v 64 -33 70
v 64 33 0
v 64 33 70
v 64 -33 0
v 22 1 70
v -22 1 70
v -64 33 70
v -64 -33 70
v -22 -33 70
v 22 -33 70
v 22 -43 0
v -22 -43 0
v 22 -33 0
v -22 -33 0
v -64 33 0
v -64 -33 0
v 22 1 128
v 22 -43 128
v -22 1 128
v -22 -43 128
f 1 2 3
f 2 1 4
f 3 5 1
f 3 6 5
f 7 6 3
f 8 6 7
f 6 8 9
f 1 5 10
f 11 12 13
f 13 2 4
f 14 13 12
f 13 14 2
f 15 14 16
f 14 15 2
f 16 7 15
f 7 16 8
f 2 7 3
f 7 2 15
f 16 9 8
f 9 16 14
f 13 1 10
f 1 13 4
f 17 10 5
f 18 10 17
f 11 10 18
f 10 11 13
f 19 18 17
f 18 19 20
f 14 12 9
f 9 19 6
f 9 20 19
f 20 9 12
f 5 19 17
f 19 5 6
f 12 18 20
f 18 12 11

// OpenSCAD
// Santa's Workshop centrepiece: five massing studies, ~190 mm tall.
// Blockouts for choosing a form, not print geometry.
// form = 1 grand hall + clock tower, 2 cross plan, 3 rotunda,
//        4 workshop castle, 5 toy factory
// part = body | roof | trim | accent
form = 1;
part = "body";
$fn = 48;

H_TOTAL = 190;
WIN_PROUD = 0.8;          // glass sits proud of the wall so it reads in a render

module arch2d(w, h) {     // round-headed window outline
    translate([-w/2, 0]) square([w, h - w/2]);
    translate([0, h - w/2]) circle(d = w);
}
// a window on a wall facing -Y at x, sill height z
module glass_y(x, y, z, w, h) {
    translate([x, y - WIN_PROUD, z]) rotate([90, 0, 0]) mirror([0,0,1])
        linear_extrude(WIN_PROUD * 2) arch2d(w, h);
}
module glass_x(x, y, z, w, h) {   // facing -X
    translate([x - WIN_PROUD, y, z]) rotate([90, 0, 90]) mirror([0,0,1])
        linear_extrude(WIN_PROUD * 2) arch2d(w, h);
}
// gable roof along X over a w (x) by d (y) box, eave height z, ridge rise r
module gable_x(w, d, z, r, over = 4) {
    translate([-w/2 - over, 0, z]) rotate([90, 0, 90])
        linear_extrude(w + 2*over)
            polygon([[-d/2 - over, 0], [d/2 + over, 0], [0, r]]);
}
module gable_y(w, d, z, r, over = 4) {
    rotate([0, 0, 90]) gable_x(d, w, z, r, over);
}
module pyramid(s, z, h) { translate([0, 0, z]) linear_extrude(h, scale = 0.02) square(s, center = true); }
module cone(r, z, h) { translate([0, 0, z]) cylinder(r1 = r, r2 = 0.4, h = h); }

// North Pole: striped post, sign board, ball on top
module pole(x, y, h = 110) {
    n = 11; seg = h / n;
    for (i = [0 : n - 1])
        if ((part == "accent" && i % 2 == 0) || (part == "trim" && i % 2 == 1))
            translate([x, y, i * seg]) cylinder(d = 6, h = seg);
    if (part == "trim") translate([x, y, h]) sphere(d = 10);
}
module sign(x, y, z, w = 54, h = 12) {   // board facing -Y
    if (part == "accent") translate([x - w/2, y - 3, z]) cube([w, 3, h]);
}

// ---------------------------------------------------------------- 1 grand hall
module form1() {
    L = 128; D = 66; WALL = 70;
    if (part == "body") {
        translate([-L/2, -D/2, 0]) cube([L, D, WALL]);
        translate([-22, -D/2 - 10, 0]) cube([44, 44, 128]);          // tower
    }
    if (part == "roof") {
        gable_x(L, D, WALL, 40);
        pyramid(52, 128, 34);
    }
    if (part == "trim") {
        for (sx = [-1, 1]) for (k = [0, 1]) {
            glass_y(sx * (30 + k * 20), -D/2, 14, 16, 42);
            mirror([0,1,0]) glass_y(sx * (30 + k * 20), -D/2, 14, 16, 42);
        }
        glass_y(0, -D/2 - 10, 72, 26, 34);                           // clock face slot
        for (sx = [-1, 1]) translate([sx * L/2, 0, 0]) glass_x(0, 0, 18, 30, 48);
        translate([0, 0, 162]) sphere(d = 14);                       // finial
    }
    if (part == "accent") translate([-10, -D/2 - 12, 0]) cube([20, 3, 34]);   // door
    pole(L/2 + 10, -D/2 - 12); sign(0, -D/2 - 10, 44);
}

// ---------------------------------------------------------------- 2 cross plan
module form2() {
    T = 48; WL = 46; WW = 42; WALL = 60;
    if (part == "body") {
        translate([-T/2, -T/2, 0]) cube([T, T, 140]);
        for (a = [0 : 90 : 270]) rotate(a) translate([T/2 - 2, -WW/2, 0]) cube([WL, WW, WALL]);
    }
    if (part == "roof") {
        pyramid(T + 8, 140, 50);
        for (a = [0 : 90 : 270]) rotate(a) translate([T/2 + WL/2 - 2, 0, 0]) gable_x(WL, WW, WALL, 30, 3);
    }
    if (part == "trim") for (a = [0 : 90 : 270]) rotate(a) {
        translate([T/2 + WL - 2, 0, 0]) glass_x(0, 0, 12, 28, 52);
        translate([0, -T/2, 0]) glass_y(0, 0, 92, 22, 36);
    }
    if (part == "accent") rotate(-90) translate([T/2 + WL - 1, -9, 0]) cube([3, 18, 30]);
    pole(T/2 + 8, -T/2 - 8, 120); sign(0, -(T/2 + WL) - 1, 64, 40);
}

// ---------------------------------------------------------------- 3 rotunda
module form3() {
    R = 60; WALL = 74;
    if (part == "body") {
        cylinder(r = R, h = WALL, $fn = 96);
        translate([0, 0, WALL]) cylinder(r = 30, h = 46);           // lantern drum
        translate([-20, -R - 14, 0]) cube([40, 20, 44]);             // porch
    }
    if (part == "roof") {
        translate([0, 0, WALL]) cylinder(r1 = R + 6, r2 = 30, h = 26, $fn = 96);
        cone(34, WALL + 46, 70);
        translate([0, -R - 8, 44]) gable_x(46, 30, 0, 18, 3);
    }
    if (part == "trim") {
        for (a = [15 : 36 : 359]) rotate(a) translate([0, -R, 0]) glass_y(0, 0, 14, 20, 46);
        for (a = [0 : 60 : 359]) rotate(a) translate([0, -30, 0]) glass_y(0, 0, WALL + 10, 10, 24);
        translate([0, 0, WALL + 46 + 70]) sphere(d = 12);
    }
    if (part == "accent") translate([-10, -R - 16, 0]) cube([20, 3, 32]);
    pole(R + 4, -R + 10, 120); sign(0, -R - 14, 52, 46);
}

// ---------------------------------------------------------------- 4 workshop castle
module form4() {
    K = 76; WALL = 96;
    T = [[-1, -1, 120], [1, -1, 150], [-1, 1, 136], [1, 1, 104]];
    if (part == "body") {
        translate([-K/2, -K/2, 0]) cube([K, K, WALL]);
        for (t = T) translate([t[0] * K/2, t[1] * K/2, 0]) cylinder(r = 17, h = t[2]);
        translate([-17, -K/2 - 14, 0]) cube([34, 18, 62]);           // gatehouse
    }
    if (part == "roof") {
        translate([0, 0, WALL]) linear_extrude(8)
            difference() { square(K, center = true); square(K - 10, center = true); }
        pyramid(K - 10, WALL, 44);
        for (t = T) translate([t[0] * K/2, t[1] * K/2, 0]) cone(21, t[2], t[2] == 150 ? 40 : 30);
        translate([0, -K/2 - 5, 62]) gable_x(40, 22, 0, 16, 2);
    }
    if (part == "trim") {
        for (a = [0 : 90 : 270]) rotate(a) for (sx = [-1, 1]) glass_y(sx * 14, -K/2, 40, 16, 42);
        for (t = T) translate([t[0] * K/2, t[1] * K/2 - 17, 0]) glass_y(0, 0, t[2] - 46, 10, 24);
    }
    if (part == "accent") translate([-9, -K/2 - 16, 0]) cube([18, 3, 34]);
    pole(-K/2 - 22, -K/2 - 16, 112); sign(0, -K/2 - 14, 46, 36);
}

// ---------------------------------------------------------------- 5 toy factory
module form5() {
    L = 132; D = 74; WALL = 62; n = 3; tw = L / n;
    if (part == "body") {
        translate([-L/2, -D/2, 0]) cube([L, D, WALL]);
        for (i = [0 : n - 1]) translate([-L/2 + i * tw, -D/2, WALL])   // sawtooth uprights
            cube([tw * 0.12, D, 30]);
    }
    if (part == "roof")
        for (i = [0 : n - 1]) translate([-L/2 + i * tw, D/2, WALL]) rotate([90, 0, 0])
            linear_extrude(D) polygon([[tw * 0.12, 30], [tw, 0], [tw * 0.12, 0]]);
    if (part == "trim") {
        for (i = [0 : n - 1]) translate([-L/2 + i * tw + tw * 0.12, 0, WALL + 2]) rotate([0, 0, 0])
            translate([-WIN_PROUD, -D/2 + 6, 0]) cube([WIN_PROUD * 2, D - 12, 25]);   // glowing skylights
        for (k = [-2 : 2]) glass_y(k * 25, -D/2, 10, 18, 40);
        mirror([0, 1, 0]) for (k = [-2 : 2]) glass_y(k * 25, -D/2, 10, 18, 40);
        translate([L/2, 0, 0]) glass_x(0, 0, 14, 40, 40);
    }
    // three chimney stacks of different heights, the tallest reaching the 190 mark
    stacks = [[-40, 12, 150], [8, 18, 190], [46, 6, 128]];
    for (s = stacks) {
        if (part == "body") translate([s[0], s[1], 0]) cylinder(d = 16, h = s[2] - 10);
        if (part == "accent") translate([s[0], s[1], s[2] - 10]) cylinder(d1 = 20, d2 = 16, h = 10);
    }
    if (part == "accent") translate([-12, -D/2 - 2, 0]) cube([24, 3, 36]);
    pole(-L/2 - 10, -D/2 - 10, 110); sign(0, -D/2, 48, 60);
}

// ---------------------------------------------------------------- shared bits for the 4+5 mixes
module crenels_rect(w, d, z, h = 7, t = 5, n = 6) {      // battlements round a w x d top
    translate([0, 0, z]) difference() {
        linear_extrude(h) difference() { square([w, d], center = true); square([w - 2*t, d - 2*t], center = true); }
        for (i = [0 : n - 1]) for (sy = [-1, 1]) {
            translate([-w/2 + (i + 0.5) * w / n - w/(4*n), sy * d/2 - t, h/2]) cube([w/(2*n), 2*t, h]);
        }
        for (i = [0 : n - 1]) for (sx = [-1, 1]) {
            translate([sx * w/2 - t, -d/2 + (i + 0.5) * d / n - d/(4*n), h/2]) cube([2*t, d/(2*n), h]);
        }
    }
}
module crenels_round(r, z, h = 6, n = 8) {
    translate([0, 0, z]) difference() {
        cylinder(r = r + 2, h = h); translate([0, 0, -1]) cylinder(r = r - 3, h = h + 2);
        for (i = [0 : n - 1]) rotate(i * 360 / n) translate([r - 6, -2.5, h/2]) cube([12, 5, h]);
    }
}
// sawtooth roof over an L x D box at eave z: n teeth rising +X, glass on each vertical face
module sawtooth(L, D, z, n, th) {
    tw = L / n;
    for (i = [0 : n - 1]) {
        x0 = -L/2 + i * tw;
        if (part == "roof") translate([x0, D/2, z]) rotate([90, 0, 0])
            linear_extrude(D) polygon([[0, th], [tw, 0], [0, 0]]);
        if (part == "trim") translate([x0 - WIN_PROUD, -D/2 + 5, z + 3]) cube([WIN_PROUD * 2, D - 10, th - 7]);
    }
}
module stack(x, y, h, d = 16) {                           // chimney stack with a banded cap
    if (part == "body") translate([x, y, 0]) cylinder(d = d, h = h - 10);
    if (part == "accent") translate([x, y, h - 10]) cylinder(d1 = d + 5, d2 = d, h = 10);
}

// ---------------------------------------------------------------- 6 castle factory (symmetric)
// The factory hall is the castle: a sawtooth hall walled by four round
// turrets, a crenellated gatehouse in front, two chimney stacks rising
// out of the roof as the tallest points.
module form6() {
    L = 124; D = 72; WALL = 64; TR = 15;
    turrets = [[-1, -1, 118], [1, -1, 118], [-1, 1, 134], [1, 1, 134]];
    if (part == "body") {
        translate([-L/2, -D/2, 0]) cube([L, D, WALL]);
        for (t = turrets) translate([t[0] * L/2, t[1] * D/2, 0]) cylinder(r = TR, h = t[2]);
        translate([-19, -D/2 - 14, 0]) cube([38, 18, 84]);                 // gatehouse
    }
    if (part == "roof") {
        for (t = turrets) translate([t[0] * L/2, t[1] * D/2, 0]) cone(TR + 4, t[2], 32);
        translate([0, -D/2 - 5, 0]) crenels_rect(38, 18, 84, n = 3);
    }
    sawtooth(L - 2*TR, D, WALL, 3, 30);
    stack(-14, 6, 176); stack(16, 6, 192, 18);
    if (part == "trim") {
        for (k = [-1, 1]) for (j = [0, 1]) glass_y(k * (31 + j * 18), -D/2, 12, 14, 40);
        mirror([0, 1, 0]) for (k = [-1.5 : 1 : 1.5]) glass_y(k * 22, -D/2, 12, 15, 42);
        for (sx = [-1, 1]) translate([sx * (L/2 + TR - 1), 0, 0]) glass_x(0, 0, 16, 26, 44);
        for (t = turrets) translate([t[0] * L/2, t[1] * D/2 - TR, 0]) glass_y(0, 0, t[2] - 44, 9, 22);
        glass_y(0, -D/2 - 14, 54, 18, 20);                                  // gatehouse rose
    }
    if (part == "accent") translate([-10, -D/2 - 16, 0]) cube([20, 3, 36]);
    pole(-L/2 - TR - 12, -D/2 - 14, 112); sign(0, -D/2 - 14, 40, 38);
}

// ---------------------------------------------------------------- 7 keep + factory wing (asymmetric)
// A castle keep with two front turrets, and running off its side a long
// sawtooth workshop wing whose chimney stacks climb past the keep.
module form7() {
    K = 66; KH = 100; WL = 92; WD = 60; WW = 56;
    wx = K/2 + WL/2 - 2;                                                    // wing centre
    if (part == "body") {
        translate([-K/2, -K/2, 0]) cube([K, K, KH]);
        for (t = [[-1, 150], [1, 126]]) translate([t[0] * K/2, -K/2, 0]) cylinder(r = 16, h = t[1]);
        translate([wx - WL/2, -WD/2, 0]) cube([WL, WD, WW]);
        translate([-17, -K/2 - 14, 0]) cube([34, 16, 64]);
    }
    if (part == "roof") {
        pyramid(K - 8, KH, 40);
        for (t = [[-1, 150], [1, 126]]) translate([t[0] * K/2, -K/2, 0]) cone(20, t[1], t[1] > 140 ? 40 : 30);
        translate([0, -K/2 - 6, 0]) crenels_rect(34, 16, 64, n = 3);
    }
    if (part == "roof") crenels_rect(K, K, KH, n = 5);
    translate([wx, 0, 0]) sawtooth(WL, WD, WW, 3, 28);
    stack(wx - 10, 14, 190, 18); stack(wx + 24, 14, 160);
    if (part == "trim") {
        for (sx = [-1, 1]) glass_y(sx * 12, -K/2, 66, 13, 26);
        for (k = [-1.5 : 1 : 1.5]) glass_y(wx + k * 21, -WD/2, 10, 14, 38);
        mirror([0, 1, 0]) for (k = [-1.5 : 1 : 1.5]) glass_y(wx + k * 21, -WD/2, 10, 14, 38);
        translate([wx + WL/2, 0, 0]) mirror([1, 0, 0]) glass_x(0, 0, 12, 30, 40);
        translate([-K/2, 0, 0]) glass_x(0, 0, 30, 26, 50);
        for (t = [[-1, 150], [1, 126]]) translate([t[0] * K/2, -K/2 - 16, 0]) glass_y(0, 0, t[1] - 42, 9, 22);
    }
    if (part == "accent") translate([-9, -K/2 - 16, 0]) cube([18, 3, 34]);
    pole(-K/2 - 26, -K/2 - 12, 112); sign(wx, -WD/2, 42, 60);
}

if (form == 1) form1();
if (form == 2) form2();
if (form == 3) form3();
if (form == 4) form4();
if (form == 5) form5();
if (form == 6) form6();
if (form == 7) form7();
